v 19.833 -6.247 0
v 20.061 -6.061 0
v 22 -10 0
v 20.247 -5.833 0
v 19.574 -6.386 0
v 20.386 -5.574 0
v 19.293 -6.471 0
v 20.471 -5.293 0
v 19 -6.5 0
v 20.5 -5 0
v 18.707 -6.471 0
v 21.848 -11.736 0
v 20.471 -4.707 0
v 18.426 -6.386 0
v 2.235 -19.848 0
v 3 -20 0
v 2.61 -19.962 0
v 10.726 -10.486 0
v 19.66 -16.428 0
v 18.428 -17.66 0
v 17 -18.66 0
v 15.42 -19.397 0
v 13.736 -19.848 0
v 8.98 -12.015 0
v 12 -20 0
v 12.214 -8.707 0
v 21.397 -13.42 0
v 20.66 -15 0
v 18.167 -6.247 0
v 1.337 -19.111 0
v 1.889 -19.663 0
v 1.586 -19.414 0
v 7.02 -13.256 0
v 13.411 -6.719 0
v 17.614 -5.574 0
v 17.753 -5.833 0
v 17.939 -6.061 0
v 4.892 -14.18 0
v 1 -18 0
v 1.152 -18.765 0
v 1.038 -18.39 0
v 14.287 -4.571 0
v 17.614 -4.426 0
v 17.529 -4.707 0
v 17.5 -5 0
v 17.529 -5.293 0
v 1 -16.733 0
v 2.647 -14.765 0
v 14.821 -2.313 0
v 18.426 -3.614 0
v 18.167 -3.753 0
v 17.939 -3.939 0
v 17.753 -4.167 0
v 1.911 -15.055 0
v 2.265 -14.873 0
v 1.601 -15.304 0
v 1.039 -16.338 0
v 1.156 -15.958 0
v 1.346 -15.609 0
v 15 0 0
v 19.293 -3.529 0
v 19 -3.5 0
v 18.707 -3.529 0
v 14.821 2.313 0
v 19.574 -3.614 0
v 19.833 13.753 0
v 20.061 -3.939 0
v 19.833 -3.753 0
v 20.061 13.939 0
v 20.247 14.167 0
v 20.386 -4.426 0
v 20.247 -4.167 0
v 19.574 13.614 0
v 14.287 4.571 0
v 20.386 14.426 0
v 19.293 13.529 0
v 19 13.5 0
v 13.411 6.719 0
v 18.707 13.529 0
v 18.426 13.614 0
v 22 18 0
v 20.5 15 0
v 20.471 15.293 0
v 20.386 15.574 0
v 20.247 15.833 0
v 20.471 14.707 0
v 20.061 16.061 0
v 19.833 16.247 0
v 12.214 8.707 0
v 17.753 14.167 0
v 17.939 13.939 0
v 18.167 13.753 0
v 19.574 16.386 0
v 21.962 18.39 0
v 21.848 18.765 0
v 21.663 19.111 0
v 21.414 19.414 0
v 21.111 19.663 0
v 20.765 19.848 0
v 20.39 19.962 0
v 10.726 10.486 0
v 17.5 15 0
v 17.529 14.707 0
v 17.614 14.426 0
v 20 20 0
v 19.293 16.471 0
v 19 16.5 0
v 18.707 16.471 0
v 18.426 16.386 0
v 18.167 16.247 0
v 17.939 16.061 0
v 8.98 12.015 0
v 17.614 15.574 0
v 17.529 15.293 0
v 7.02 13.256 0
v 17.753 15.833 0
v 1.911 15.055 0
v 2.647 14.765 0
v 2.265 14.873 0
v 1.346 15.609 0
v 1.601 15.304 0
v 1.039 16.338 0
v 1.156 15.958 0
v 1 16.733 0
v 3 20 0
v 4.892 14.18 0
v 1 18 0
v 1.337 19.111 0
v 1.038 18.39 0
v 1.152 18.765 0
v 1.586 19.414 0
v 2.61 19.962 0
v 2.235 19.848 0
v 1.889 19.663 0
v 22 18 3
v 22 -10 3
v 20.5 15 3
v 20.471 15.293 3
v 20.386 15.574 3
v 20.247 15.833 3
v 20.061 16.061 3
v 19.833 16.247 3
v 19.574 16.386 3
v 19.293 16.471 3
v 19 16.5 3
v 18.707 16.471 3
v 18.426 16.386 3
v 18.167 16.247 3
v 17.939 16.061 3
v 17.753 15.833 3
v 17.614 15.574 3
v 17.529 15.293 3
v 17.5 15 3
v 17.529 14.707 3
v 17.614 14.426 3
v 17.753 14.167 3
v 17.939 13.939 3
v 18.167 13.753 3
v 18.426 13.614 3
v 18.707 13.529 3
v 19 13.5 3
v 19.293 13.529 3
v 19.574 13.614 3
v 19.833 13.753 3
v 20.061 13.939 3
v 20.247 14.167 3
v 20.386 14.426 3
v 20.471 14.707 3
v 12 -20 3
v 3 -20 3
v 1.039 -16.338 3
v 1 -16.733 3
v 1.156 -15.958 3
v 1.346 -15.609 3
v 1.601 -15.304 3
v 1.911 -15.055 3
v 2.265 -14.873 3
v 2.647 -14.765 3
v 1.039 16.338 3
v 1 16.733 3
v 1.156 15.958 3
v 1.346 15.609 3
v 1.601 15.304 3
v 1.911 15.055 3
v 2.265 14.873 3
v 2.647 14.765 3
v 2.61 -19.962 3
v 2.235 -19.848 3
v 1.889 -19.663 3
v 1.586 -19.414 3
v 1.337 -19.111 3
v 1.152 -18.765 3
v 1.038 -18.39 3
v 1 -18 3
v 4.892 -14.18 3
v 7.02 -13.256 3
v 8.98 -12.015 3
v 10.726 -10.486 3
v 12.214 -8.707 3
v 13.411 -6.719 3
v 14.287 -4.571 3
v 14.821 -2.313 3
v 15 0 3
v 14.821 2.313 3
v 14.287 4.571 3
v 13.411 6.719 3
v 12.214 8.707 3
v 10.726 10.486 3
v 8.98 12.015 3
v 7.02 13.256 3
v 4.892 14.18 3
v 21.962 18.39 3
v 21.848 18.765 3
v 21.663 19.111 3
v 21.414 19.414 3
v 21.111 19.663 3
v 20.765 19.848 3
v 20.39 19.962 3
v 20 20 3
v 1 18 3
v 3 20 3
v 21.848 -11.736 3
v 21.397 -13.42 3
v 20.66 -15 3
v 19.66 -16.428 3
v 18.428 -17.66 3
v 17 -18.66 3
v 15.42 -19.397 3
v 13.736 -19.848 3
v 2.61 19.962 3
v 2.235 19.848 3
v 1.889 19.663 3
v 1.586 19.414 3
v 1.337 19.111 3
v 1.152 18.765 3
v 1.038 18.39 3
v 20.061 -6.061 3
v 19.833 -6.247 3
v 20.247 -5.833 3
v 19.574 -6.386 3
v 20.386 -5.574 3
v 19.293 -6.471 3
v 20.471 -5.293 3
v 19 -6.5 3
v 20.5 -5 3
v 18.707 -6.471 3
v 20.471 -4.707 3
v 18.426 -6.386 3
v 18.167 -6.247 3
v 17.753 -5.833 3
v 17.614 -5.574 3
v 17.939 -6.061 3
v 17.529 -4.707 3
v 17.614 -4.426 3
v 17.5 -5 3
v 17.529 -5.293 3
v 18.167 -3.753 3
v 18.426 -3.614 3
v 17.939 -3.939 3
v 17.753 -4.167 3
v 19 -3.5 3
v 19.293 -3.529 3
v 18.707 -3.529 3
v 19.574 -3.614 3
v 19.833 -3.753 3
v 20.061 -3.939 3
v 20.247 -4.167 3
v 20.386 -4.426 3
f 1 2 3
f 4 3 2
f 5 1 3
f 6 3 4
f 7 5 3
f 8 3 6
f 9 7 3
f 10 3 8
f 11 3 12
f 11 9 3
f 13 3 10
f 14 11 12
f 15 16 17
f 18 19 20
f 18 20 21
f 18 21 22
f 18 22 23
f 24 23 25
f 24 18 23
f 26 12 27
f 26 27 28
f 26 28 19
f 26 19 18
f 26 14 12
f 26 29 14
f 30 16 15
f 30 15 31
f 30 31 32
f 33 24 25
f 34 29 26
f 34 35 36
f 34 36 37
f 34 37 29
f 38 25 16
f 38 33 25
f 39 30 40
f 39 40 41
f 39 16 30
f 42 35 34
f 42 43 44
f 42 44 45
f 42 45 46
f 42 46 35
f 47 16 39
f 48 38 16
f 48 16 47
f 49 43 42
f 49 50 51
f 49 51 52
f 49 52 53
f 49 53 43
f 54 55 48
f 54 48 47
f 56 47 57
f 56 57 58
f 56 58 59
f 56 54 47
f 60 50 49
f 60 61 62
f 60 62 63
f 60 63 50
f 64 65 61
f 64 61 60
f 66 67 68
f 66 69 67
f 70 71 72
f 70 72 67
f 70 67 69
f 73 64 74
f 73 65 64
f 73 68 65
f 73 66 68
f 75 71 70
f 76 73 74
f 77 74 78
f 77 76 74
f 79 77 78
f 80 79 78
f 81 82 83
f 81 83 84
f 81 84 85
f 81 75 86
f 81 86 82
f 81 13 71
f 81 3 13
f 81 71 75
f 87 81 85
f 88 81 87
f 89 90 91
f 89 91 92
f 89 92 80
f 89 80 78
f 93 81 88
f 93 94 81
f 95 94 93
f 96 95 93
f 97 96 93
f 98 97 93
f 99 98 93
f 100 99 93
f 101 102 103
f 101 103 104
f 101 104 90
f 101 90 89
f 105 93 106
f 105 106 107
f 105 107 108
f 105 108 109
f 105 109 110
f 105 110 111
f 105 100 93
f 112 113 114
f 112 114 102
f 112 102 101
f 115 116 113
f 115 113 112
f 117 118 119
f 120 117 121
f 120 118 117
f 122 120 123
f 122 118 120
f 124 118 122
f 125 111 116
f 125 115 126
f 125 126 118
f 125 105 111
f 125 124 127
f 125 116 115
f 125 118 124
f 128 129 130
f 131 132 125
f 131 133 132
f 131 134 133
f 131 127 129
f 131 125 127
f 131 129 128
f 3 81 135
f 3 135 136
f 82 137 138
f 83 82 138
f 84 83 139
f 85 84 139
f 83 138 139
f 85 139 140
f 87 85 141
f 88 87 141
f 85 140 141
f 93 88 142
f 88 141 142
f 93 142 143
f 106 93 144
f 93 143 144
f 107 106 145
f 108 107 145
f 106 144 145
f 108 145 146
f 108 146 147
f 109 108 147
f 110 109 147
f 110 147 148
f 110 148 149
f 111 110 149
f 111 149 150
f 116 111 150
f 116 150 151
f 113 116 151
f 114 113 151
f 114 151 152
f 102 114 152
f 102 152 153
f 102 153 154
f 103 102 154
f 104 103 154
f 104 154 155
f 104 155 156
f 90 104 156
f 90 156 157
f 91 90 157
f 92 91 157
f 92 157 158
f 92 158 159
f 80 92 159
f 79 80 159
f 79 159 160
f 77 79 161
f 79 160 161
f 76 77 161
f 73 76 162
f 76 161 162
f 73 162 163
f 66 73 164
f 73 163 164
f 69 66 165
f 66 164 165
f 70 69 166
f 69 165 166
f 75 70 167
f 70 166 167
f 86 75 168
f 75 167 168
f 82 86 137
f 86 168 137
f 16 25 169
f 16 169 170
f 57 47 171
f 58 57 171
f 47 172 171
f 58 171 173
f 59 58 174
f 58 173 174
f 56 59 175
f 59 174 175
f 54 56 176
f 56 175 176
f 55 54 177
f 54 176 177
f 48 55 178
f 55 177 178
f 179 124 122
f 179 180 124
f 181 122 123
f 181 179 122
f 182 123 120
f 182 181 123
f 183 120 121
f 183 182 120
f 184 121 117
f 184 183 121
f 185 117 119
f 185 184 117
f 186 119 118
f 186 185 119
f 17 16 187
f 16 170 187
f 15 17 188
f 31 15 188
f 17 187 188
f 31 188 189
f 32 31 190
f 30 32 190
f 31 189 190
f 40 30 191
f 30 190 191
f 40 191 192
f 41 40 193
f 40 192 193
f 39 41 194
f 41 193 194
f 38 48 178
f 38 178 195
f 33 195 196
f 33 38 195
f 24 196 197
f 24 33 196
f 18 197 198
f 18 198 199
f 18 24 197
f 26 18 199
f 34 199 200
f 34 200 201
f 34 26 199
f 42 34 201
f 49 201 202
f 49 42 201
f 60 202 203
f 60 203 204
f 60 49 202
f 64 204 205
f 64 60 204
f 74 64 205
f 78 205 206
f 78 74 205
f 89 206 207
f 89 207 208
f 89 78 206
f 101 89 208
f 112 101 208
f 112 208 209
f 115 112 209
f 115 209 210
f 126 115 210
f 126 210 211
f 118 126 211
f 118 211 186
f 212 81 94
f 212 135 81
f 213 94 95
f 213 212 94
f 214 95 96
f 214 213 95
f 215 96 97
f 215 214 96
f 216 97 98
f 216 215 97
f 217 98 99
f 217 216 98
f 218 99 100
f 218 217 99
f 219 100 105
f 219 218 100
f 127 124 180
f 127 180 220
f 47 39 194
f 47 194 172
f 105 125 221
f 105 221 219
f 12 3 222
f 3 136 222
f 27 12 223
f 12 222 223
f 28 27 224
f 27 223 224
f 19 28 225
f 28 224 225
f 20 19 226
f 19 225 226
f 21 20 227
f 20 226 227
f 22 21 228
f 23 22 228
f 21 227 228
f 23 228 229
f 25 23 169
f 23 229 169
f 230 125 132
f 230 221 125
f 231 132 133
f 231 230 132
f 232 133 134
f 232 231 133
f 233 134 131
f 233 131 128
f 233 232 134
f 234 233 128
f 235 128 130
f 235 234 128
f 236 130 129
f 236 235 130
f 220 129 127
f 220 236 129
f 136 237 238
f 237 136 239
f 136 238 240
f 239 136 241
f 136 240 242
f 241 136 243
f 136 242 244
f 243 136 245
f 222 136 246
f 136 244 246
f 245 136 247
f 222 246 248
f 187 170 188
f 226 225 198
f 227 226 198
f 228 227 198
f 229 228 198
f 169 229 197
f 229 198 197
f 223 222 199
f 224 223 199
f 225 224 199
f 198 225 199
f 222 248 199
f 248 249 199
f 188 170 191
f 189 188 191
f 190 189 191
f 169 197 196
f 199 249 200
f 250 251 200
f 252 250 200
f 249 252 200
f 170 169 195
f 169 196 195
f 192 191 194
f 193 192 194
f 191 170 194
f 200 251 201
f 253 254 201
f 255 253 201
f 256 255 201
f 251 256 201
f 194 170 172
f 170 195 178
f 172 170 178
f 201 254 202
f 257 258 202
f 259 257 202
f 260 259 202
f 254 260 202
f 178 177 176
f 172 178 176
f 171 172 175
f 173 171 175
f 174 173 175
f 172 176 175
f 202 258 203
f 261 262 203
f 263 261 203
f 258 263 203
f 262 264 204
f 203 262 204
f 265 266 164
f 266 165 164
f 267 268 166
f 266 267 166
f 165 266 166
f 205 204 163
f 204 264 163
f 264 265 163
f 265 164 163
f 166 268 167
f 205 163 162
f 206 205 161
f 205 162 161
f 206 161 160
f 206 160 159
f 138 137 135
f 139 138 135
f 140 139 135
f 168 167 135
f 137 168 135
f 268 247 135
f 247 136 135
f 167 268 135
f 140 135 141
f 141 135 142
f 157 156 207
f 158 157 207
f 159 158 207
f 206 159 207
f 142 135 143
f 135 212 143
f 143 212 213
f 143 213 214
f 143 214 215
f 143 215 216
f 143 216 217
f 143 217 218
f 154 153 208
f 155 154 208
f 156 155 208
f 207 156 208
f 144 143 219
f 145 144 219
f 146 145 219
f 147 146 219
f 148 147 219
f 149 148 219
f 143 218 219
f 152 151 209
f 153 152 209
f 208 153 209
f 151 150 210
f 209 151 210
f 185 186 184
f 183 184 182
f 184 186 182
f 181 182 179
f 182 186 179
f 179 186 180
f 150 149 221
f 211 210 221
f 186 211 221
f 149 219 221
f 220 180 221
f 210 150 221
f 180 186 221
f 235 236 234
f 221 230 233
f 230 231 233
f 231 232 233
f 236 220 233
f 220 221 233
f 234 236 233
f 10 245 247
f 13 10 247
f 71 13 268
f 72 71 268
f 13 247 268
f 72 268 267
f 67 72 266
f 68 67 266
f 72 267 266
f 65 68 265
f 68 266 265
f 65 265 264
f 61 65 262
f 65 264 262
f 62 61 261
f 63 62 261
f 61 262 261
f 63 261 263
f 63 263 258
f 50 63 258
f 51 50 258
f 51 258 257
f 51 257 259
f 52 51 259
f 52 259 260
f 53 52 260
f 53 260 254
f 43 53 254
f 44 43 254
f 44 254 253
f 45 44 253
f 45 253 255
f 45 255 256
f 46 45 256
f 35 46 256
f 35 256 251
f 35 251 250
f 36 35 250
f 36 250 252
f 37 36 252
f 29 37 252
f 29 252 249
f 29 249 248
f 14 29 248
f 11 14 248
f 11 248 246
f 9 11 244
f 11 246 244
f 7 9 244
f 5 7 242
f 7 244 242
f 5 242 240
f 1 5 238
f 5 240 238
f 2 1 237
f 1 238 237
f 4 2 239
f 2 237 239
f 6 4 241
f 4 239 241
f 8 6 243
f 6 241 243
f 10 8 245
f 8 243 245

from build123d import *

# Parameters (mm, degrees)
EXTRUDE_1_DEPTH     = 3
SKETCH_2_R          = 1.5
CUT_EXTRUDE_1_DEPTH = 30.883105595
FILLET_1_R          = 10
FILLET_2_R          = 2


with BuildPart() as part:
    # 草图1 → 凸台-拉伸1 (new body)
    with BuildSketch(Plane.XY):
        with BuildLine():
            Line((22, 20), (22, -20))
            Line((22, -20), (1, -20))
            Line((1, -20), (1, -14.966629547))
            ThreePointArc((1, -14.966629547), (15, 0), (1, 14.966629547))
            Line((1, 14.966629547), (1, 20))
            Line((1, 20), (22, 20))
        make_face()
    extrude(amount=EXTRUDE_1_DEPTH)

    # 草图2 → 切除-拉伸1 (cut, through all)
    with BuildSketch(Plane.XY.offset(3)):
        with Locations((19, 15)):
            Circle(SKETCH_2_R)
        with Locations((19, -5)):
            Circle(SKETCH_2_R)
    extrude(amount=-CUT_EXTRUDE_1_DEPTH, mode=Mode.SUBTRACT)

    # 圆角1
    fillet_1_edges = [part.edges().sort_by_distance(p)[0] for p in [
        (22, -20, 1.5),
    ]]
    fillet(fillet_1_edges, radius=FILLET_1_R)

    # 圆角2
    fillet_2_edges = [part.edges().sort_by_distance(p)[0] for p in [
        (1, 20, 1.5),
        (22, 20, 1.5),
        (1, -20, 1.5),
        (1, -14.966629547, 1.5),
        (1, 14.966629547, 1.5),
    ]]
    fillet(fillet_2_edges, radius=FILLET_2_R)


solid = part.part
